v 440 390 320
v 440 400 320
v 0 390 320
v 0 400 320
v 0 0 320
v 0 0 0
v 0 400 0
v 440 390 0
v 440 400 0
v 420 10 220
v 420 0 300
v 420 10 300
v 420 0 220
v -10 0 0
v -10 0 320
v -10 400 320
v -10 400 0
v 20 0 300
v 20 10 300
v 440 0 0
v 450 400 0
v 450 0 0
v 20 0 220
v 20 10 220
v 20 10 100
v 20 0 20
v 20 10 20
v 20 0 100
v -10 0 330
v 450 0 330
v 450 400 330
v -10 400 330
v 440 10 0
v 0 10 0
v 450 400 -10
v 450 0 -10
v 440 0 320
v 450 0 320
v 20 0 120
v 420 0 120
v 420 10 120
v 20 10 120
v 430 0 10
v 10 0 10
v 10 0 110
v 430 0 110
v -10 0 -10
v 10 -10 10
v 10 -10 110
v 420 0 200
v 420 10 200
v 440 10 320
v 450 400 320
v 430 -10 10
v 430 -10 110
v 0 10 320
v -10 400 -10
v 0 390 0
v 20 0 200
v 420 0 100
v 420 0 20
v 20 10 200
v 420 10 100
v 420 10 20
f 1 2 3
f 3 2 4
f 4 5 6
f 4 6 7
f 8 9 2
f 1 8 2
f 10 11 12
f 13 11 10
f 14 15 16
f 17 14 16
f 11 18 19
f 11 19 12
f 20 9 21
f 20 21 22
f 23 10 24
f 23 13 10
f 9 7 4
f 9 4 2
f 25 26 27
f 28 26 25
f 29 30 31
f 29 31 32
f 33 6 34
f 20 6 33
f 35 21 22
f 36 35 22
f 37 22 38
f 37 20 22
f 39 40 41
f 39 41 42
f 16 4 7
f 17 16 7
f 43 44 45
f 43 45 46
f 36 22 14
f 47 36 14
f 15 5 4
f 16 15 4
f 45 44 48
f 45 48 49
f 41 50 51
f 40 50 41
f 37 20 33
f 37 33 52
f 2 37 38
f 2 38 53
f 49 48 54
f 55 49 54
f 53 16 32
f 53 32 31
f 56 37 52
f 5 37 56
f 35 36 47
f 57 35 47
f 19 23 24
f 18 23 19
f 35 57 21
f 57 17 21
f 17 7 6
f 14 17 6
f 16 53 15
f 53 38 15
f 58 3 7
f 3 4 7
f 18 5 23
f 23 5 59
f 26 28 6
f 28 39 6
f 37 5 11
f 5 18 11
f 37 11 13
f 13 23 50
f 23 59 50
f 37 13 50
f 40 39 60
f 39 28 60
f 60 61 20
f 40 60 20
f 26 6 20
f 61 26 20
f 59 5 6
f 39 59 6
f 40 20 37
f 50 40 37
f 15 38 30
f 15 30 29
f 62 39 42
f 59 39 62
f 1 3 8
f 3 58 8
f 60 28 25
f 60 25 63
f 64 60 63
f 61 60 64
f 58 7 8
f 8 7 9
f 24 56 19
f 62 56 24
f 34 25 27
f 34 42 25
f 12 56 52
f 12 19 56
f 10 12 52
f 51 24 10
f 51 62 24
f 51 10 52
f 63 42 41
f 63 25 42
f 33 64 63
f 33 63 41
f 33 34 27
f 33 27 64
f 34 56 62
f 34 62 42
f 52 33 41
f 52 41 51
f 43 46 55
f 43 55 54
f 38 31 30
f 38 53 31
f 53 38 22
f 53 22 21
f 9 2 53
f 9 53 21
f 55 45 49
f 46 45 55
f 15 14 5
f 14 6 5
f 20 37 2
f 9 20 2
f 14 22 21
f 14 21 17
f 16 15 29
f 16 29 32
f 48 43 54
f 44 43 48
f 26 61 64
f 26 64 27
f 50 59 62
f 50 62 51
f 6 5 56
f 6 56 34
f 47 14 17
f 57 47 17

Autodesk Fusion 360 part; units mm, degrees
sketch "Sketch1" plane through (0, 0, 0) normal (0, 1, 0) x (1, 0, 0)
  line L0 (0, 0) -> (440, 0)
  line L1 (440, 0) -> (440, -320)
  line L2 (440, -320) -> (0, -320)
  line L3 (0, -320) -> (0, 0)
  line L4 (20, -100) -> (420, -100)
  line L5 (420, -100) -> (420, -20)
  line L6 (420, -20) -> (20, -20)
  line L7 (20, -20) -> (20, -100)
  line L8 (220, 0) -> (220, -320) construction
  line L9 (430, -10) -> (10, -10)
  line L10 (10, -10) -> (10, -110)
  line L11 (10, -110) -> (430, -110)
  line L12 (430, -110) -> (430, -10)
  dimension "d6" = 440
  dimension "d7" = 320
  dimension "d8" = 80
  dimension "d9" = 400
  dimension "d10" = 20
  dimension "d33" = 10
extrude "Extrude1" add sketch "Sketch1" along normal blind 10 contours L0 L1 L2 L3 | L4 L5 L6 L7 | L9 L10 L11 L12 makes body 1
extrude "Extrude2" cut sketch "Sketch1" along normal up to surface (10 mm away) contours L4 L5 L6 L7 bodies 1
pattern_linear "R-Pattern1" count 3 spacing 100 along (0, 0, 1) of "Extrude2"
sketch "Sketch2" plane through (440, 0, 0) normal (1, 0, 0) x (0, 1, 0)
  line L0 (0, 0) -> (0, 320)
  line L1 (0, 320) -> (400, 320)
  line L2 (400, 320) -> (400, 0)
  line L3 (400, 0) -> (0, 0)
  line L4 (0, 0) -> (0, 320)
  dimension "d19" = 400
extrude "Extrude3" add sketch "Sketch2" along normal blind 10 separate body makes body 2
extrude "Extrude4" add sketch "Sketch2" against normal blind 10 from surface at -440 separate body makes body 3
extrude "Extrude5" add sketch "Sketch1" against normal blind 10 from surface at 400 separate body contours L0 L1 L2 L3 | L4 L5 L6 L7 | L9 L10 L11 L12 makes body 4
sketch "Sketch3" plane through (0, 0, 320) normal (0, 0, 1) x (-1, 0, 0)
  line L0 (10, -400) -> (-450, -400)
  line L1 (-450, -400) -> (-450, 0)
  line L2 (-450, 0) -> (10, 0)
  line L3 (10, 0) -> (10, -400)
extrude "Extrude6" add sketch "Sketch3" along normal blind 10 separate body makes body 5
extrude "Extrude7" add sketch "Sketch3" against normal blind 10 from surface at -320 separate body makes body 6
extrude "Extrude8" add sketch "Sketch1" against normal blind 10 separate body contours L4 L5 L6 L7 | L9 L10 L11 L12 makes body 7
equation "numdrawers = 3"
equation "thickness = 10 mm"
equation "space = thickness * 2"
equation "drheight = 80 mm"
equation "drlong = 400 mm"
equation "d6 = drlong + space * 2"
equation "d7 = numdrawers * ( drheight + space ) + space"
equation "d8 = drheight"
equation "d9 = drlong"
equation "d10 = space"
equation "d11 = thickness"
equation "d15 = numdrawers"
equation "d17 = space + drheight"
equation "d19 = drlong"
equation "d20 = thickness"
equation "d23 = -thickness"
equation "d26 = -thickness"
equation "d28 = thickness"
equation "d31 = -thickness"
equation "d33 = thickness"
equation "d34 = -thickness"
